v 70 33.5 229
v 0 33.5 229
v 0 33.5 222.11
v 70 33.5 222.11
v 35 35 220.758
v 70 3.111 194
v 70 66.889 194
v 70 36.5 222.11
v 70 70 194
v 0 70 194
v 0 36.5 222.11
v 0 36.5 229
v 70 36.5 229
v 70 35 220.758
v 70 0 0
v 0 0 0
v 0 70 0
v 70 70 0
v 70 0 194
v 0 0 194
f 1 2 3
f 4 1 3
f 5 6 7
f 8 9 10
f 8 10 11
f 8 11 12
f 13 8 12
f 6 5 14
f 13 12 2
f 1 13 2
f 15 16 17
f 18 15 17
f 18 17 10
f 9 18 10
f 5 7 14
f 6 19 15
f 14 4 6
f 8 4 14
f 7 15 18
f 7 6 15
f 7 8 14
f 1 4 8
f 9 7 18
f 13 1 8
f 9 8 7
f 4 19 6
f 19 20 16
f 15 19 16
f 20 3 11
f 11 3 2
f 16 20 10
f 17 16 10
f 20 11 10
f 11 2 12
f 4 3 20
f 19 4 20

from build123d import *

# Parameters (mm, degrees)
F1_DEPTH = 70


with BuildPart() as f1:
    # F0 (on Right) → F1 (new body)
    with BuildSketch(Plane.YZ):
        Polygon((0, 194), (0, 0), (70, 0), (70, 194), (36.5, 222.109838), (36.5, 229), (33.5, 229), (33.5, 222.109838), align=None)
    extrude(amount=F1_DEPTH)

    # F2 (on face) → F5 section 0
    with BuildSketch(Plane.YZ.offset(70), mode=Mode.PRIVATE) as f5_s0:
        Polygon((35, 220.757673), (3.111448, 194), (66.888552, 194), align=None)
    loft([f5_s0.sketch, Vertex(35, 35, 220.757673)], mode=Mode.SUBTRACT)


solid = f1.part
